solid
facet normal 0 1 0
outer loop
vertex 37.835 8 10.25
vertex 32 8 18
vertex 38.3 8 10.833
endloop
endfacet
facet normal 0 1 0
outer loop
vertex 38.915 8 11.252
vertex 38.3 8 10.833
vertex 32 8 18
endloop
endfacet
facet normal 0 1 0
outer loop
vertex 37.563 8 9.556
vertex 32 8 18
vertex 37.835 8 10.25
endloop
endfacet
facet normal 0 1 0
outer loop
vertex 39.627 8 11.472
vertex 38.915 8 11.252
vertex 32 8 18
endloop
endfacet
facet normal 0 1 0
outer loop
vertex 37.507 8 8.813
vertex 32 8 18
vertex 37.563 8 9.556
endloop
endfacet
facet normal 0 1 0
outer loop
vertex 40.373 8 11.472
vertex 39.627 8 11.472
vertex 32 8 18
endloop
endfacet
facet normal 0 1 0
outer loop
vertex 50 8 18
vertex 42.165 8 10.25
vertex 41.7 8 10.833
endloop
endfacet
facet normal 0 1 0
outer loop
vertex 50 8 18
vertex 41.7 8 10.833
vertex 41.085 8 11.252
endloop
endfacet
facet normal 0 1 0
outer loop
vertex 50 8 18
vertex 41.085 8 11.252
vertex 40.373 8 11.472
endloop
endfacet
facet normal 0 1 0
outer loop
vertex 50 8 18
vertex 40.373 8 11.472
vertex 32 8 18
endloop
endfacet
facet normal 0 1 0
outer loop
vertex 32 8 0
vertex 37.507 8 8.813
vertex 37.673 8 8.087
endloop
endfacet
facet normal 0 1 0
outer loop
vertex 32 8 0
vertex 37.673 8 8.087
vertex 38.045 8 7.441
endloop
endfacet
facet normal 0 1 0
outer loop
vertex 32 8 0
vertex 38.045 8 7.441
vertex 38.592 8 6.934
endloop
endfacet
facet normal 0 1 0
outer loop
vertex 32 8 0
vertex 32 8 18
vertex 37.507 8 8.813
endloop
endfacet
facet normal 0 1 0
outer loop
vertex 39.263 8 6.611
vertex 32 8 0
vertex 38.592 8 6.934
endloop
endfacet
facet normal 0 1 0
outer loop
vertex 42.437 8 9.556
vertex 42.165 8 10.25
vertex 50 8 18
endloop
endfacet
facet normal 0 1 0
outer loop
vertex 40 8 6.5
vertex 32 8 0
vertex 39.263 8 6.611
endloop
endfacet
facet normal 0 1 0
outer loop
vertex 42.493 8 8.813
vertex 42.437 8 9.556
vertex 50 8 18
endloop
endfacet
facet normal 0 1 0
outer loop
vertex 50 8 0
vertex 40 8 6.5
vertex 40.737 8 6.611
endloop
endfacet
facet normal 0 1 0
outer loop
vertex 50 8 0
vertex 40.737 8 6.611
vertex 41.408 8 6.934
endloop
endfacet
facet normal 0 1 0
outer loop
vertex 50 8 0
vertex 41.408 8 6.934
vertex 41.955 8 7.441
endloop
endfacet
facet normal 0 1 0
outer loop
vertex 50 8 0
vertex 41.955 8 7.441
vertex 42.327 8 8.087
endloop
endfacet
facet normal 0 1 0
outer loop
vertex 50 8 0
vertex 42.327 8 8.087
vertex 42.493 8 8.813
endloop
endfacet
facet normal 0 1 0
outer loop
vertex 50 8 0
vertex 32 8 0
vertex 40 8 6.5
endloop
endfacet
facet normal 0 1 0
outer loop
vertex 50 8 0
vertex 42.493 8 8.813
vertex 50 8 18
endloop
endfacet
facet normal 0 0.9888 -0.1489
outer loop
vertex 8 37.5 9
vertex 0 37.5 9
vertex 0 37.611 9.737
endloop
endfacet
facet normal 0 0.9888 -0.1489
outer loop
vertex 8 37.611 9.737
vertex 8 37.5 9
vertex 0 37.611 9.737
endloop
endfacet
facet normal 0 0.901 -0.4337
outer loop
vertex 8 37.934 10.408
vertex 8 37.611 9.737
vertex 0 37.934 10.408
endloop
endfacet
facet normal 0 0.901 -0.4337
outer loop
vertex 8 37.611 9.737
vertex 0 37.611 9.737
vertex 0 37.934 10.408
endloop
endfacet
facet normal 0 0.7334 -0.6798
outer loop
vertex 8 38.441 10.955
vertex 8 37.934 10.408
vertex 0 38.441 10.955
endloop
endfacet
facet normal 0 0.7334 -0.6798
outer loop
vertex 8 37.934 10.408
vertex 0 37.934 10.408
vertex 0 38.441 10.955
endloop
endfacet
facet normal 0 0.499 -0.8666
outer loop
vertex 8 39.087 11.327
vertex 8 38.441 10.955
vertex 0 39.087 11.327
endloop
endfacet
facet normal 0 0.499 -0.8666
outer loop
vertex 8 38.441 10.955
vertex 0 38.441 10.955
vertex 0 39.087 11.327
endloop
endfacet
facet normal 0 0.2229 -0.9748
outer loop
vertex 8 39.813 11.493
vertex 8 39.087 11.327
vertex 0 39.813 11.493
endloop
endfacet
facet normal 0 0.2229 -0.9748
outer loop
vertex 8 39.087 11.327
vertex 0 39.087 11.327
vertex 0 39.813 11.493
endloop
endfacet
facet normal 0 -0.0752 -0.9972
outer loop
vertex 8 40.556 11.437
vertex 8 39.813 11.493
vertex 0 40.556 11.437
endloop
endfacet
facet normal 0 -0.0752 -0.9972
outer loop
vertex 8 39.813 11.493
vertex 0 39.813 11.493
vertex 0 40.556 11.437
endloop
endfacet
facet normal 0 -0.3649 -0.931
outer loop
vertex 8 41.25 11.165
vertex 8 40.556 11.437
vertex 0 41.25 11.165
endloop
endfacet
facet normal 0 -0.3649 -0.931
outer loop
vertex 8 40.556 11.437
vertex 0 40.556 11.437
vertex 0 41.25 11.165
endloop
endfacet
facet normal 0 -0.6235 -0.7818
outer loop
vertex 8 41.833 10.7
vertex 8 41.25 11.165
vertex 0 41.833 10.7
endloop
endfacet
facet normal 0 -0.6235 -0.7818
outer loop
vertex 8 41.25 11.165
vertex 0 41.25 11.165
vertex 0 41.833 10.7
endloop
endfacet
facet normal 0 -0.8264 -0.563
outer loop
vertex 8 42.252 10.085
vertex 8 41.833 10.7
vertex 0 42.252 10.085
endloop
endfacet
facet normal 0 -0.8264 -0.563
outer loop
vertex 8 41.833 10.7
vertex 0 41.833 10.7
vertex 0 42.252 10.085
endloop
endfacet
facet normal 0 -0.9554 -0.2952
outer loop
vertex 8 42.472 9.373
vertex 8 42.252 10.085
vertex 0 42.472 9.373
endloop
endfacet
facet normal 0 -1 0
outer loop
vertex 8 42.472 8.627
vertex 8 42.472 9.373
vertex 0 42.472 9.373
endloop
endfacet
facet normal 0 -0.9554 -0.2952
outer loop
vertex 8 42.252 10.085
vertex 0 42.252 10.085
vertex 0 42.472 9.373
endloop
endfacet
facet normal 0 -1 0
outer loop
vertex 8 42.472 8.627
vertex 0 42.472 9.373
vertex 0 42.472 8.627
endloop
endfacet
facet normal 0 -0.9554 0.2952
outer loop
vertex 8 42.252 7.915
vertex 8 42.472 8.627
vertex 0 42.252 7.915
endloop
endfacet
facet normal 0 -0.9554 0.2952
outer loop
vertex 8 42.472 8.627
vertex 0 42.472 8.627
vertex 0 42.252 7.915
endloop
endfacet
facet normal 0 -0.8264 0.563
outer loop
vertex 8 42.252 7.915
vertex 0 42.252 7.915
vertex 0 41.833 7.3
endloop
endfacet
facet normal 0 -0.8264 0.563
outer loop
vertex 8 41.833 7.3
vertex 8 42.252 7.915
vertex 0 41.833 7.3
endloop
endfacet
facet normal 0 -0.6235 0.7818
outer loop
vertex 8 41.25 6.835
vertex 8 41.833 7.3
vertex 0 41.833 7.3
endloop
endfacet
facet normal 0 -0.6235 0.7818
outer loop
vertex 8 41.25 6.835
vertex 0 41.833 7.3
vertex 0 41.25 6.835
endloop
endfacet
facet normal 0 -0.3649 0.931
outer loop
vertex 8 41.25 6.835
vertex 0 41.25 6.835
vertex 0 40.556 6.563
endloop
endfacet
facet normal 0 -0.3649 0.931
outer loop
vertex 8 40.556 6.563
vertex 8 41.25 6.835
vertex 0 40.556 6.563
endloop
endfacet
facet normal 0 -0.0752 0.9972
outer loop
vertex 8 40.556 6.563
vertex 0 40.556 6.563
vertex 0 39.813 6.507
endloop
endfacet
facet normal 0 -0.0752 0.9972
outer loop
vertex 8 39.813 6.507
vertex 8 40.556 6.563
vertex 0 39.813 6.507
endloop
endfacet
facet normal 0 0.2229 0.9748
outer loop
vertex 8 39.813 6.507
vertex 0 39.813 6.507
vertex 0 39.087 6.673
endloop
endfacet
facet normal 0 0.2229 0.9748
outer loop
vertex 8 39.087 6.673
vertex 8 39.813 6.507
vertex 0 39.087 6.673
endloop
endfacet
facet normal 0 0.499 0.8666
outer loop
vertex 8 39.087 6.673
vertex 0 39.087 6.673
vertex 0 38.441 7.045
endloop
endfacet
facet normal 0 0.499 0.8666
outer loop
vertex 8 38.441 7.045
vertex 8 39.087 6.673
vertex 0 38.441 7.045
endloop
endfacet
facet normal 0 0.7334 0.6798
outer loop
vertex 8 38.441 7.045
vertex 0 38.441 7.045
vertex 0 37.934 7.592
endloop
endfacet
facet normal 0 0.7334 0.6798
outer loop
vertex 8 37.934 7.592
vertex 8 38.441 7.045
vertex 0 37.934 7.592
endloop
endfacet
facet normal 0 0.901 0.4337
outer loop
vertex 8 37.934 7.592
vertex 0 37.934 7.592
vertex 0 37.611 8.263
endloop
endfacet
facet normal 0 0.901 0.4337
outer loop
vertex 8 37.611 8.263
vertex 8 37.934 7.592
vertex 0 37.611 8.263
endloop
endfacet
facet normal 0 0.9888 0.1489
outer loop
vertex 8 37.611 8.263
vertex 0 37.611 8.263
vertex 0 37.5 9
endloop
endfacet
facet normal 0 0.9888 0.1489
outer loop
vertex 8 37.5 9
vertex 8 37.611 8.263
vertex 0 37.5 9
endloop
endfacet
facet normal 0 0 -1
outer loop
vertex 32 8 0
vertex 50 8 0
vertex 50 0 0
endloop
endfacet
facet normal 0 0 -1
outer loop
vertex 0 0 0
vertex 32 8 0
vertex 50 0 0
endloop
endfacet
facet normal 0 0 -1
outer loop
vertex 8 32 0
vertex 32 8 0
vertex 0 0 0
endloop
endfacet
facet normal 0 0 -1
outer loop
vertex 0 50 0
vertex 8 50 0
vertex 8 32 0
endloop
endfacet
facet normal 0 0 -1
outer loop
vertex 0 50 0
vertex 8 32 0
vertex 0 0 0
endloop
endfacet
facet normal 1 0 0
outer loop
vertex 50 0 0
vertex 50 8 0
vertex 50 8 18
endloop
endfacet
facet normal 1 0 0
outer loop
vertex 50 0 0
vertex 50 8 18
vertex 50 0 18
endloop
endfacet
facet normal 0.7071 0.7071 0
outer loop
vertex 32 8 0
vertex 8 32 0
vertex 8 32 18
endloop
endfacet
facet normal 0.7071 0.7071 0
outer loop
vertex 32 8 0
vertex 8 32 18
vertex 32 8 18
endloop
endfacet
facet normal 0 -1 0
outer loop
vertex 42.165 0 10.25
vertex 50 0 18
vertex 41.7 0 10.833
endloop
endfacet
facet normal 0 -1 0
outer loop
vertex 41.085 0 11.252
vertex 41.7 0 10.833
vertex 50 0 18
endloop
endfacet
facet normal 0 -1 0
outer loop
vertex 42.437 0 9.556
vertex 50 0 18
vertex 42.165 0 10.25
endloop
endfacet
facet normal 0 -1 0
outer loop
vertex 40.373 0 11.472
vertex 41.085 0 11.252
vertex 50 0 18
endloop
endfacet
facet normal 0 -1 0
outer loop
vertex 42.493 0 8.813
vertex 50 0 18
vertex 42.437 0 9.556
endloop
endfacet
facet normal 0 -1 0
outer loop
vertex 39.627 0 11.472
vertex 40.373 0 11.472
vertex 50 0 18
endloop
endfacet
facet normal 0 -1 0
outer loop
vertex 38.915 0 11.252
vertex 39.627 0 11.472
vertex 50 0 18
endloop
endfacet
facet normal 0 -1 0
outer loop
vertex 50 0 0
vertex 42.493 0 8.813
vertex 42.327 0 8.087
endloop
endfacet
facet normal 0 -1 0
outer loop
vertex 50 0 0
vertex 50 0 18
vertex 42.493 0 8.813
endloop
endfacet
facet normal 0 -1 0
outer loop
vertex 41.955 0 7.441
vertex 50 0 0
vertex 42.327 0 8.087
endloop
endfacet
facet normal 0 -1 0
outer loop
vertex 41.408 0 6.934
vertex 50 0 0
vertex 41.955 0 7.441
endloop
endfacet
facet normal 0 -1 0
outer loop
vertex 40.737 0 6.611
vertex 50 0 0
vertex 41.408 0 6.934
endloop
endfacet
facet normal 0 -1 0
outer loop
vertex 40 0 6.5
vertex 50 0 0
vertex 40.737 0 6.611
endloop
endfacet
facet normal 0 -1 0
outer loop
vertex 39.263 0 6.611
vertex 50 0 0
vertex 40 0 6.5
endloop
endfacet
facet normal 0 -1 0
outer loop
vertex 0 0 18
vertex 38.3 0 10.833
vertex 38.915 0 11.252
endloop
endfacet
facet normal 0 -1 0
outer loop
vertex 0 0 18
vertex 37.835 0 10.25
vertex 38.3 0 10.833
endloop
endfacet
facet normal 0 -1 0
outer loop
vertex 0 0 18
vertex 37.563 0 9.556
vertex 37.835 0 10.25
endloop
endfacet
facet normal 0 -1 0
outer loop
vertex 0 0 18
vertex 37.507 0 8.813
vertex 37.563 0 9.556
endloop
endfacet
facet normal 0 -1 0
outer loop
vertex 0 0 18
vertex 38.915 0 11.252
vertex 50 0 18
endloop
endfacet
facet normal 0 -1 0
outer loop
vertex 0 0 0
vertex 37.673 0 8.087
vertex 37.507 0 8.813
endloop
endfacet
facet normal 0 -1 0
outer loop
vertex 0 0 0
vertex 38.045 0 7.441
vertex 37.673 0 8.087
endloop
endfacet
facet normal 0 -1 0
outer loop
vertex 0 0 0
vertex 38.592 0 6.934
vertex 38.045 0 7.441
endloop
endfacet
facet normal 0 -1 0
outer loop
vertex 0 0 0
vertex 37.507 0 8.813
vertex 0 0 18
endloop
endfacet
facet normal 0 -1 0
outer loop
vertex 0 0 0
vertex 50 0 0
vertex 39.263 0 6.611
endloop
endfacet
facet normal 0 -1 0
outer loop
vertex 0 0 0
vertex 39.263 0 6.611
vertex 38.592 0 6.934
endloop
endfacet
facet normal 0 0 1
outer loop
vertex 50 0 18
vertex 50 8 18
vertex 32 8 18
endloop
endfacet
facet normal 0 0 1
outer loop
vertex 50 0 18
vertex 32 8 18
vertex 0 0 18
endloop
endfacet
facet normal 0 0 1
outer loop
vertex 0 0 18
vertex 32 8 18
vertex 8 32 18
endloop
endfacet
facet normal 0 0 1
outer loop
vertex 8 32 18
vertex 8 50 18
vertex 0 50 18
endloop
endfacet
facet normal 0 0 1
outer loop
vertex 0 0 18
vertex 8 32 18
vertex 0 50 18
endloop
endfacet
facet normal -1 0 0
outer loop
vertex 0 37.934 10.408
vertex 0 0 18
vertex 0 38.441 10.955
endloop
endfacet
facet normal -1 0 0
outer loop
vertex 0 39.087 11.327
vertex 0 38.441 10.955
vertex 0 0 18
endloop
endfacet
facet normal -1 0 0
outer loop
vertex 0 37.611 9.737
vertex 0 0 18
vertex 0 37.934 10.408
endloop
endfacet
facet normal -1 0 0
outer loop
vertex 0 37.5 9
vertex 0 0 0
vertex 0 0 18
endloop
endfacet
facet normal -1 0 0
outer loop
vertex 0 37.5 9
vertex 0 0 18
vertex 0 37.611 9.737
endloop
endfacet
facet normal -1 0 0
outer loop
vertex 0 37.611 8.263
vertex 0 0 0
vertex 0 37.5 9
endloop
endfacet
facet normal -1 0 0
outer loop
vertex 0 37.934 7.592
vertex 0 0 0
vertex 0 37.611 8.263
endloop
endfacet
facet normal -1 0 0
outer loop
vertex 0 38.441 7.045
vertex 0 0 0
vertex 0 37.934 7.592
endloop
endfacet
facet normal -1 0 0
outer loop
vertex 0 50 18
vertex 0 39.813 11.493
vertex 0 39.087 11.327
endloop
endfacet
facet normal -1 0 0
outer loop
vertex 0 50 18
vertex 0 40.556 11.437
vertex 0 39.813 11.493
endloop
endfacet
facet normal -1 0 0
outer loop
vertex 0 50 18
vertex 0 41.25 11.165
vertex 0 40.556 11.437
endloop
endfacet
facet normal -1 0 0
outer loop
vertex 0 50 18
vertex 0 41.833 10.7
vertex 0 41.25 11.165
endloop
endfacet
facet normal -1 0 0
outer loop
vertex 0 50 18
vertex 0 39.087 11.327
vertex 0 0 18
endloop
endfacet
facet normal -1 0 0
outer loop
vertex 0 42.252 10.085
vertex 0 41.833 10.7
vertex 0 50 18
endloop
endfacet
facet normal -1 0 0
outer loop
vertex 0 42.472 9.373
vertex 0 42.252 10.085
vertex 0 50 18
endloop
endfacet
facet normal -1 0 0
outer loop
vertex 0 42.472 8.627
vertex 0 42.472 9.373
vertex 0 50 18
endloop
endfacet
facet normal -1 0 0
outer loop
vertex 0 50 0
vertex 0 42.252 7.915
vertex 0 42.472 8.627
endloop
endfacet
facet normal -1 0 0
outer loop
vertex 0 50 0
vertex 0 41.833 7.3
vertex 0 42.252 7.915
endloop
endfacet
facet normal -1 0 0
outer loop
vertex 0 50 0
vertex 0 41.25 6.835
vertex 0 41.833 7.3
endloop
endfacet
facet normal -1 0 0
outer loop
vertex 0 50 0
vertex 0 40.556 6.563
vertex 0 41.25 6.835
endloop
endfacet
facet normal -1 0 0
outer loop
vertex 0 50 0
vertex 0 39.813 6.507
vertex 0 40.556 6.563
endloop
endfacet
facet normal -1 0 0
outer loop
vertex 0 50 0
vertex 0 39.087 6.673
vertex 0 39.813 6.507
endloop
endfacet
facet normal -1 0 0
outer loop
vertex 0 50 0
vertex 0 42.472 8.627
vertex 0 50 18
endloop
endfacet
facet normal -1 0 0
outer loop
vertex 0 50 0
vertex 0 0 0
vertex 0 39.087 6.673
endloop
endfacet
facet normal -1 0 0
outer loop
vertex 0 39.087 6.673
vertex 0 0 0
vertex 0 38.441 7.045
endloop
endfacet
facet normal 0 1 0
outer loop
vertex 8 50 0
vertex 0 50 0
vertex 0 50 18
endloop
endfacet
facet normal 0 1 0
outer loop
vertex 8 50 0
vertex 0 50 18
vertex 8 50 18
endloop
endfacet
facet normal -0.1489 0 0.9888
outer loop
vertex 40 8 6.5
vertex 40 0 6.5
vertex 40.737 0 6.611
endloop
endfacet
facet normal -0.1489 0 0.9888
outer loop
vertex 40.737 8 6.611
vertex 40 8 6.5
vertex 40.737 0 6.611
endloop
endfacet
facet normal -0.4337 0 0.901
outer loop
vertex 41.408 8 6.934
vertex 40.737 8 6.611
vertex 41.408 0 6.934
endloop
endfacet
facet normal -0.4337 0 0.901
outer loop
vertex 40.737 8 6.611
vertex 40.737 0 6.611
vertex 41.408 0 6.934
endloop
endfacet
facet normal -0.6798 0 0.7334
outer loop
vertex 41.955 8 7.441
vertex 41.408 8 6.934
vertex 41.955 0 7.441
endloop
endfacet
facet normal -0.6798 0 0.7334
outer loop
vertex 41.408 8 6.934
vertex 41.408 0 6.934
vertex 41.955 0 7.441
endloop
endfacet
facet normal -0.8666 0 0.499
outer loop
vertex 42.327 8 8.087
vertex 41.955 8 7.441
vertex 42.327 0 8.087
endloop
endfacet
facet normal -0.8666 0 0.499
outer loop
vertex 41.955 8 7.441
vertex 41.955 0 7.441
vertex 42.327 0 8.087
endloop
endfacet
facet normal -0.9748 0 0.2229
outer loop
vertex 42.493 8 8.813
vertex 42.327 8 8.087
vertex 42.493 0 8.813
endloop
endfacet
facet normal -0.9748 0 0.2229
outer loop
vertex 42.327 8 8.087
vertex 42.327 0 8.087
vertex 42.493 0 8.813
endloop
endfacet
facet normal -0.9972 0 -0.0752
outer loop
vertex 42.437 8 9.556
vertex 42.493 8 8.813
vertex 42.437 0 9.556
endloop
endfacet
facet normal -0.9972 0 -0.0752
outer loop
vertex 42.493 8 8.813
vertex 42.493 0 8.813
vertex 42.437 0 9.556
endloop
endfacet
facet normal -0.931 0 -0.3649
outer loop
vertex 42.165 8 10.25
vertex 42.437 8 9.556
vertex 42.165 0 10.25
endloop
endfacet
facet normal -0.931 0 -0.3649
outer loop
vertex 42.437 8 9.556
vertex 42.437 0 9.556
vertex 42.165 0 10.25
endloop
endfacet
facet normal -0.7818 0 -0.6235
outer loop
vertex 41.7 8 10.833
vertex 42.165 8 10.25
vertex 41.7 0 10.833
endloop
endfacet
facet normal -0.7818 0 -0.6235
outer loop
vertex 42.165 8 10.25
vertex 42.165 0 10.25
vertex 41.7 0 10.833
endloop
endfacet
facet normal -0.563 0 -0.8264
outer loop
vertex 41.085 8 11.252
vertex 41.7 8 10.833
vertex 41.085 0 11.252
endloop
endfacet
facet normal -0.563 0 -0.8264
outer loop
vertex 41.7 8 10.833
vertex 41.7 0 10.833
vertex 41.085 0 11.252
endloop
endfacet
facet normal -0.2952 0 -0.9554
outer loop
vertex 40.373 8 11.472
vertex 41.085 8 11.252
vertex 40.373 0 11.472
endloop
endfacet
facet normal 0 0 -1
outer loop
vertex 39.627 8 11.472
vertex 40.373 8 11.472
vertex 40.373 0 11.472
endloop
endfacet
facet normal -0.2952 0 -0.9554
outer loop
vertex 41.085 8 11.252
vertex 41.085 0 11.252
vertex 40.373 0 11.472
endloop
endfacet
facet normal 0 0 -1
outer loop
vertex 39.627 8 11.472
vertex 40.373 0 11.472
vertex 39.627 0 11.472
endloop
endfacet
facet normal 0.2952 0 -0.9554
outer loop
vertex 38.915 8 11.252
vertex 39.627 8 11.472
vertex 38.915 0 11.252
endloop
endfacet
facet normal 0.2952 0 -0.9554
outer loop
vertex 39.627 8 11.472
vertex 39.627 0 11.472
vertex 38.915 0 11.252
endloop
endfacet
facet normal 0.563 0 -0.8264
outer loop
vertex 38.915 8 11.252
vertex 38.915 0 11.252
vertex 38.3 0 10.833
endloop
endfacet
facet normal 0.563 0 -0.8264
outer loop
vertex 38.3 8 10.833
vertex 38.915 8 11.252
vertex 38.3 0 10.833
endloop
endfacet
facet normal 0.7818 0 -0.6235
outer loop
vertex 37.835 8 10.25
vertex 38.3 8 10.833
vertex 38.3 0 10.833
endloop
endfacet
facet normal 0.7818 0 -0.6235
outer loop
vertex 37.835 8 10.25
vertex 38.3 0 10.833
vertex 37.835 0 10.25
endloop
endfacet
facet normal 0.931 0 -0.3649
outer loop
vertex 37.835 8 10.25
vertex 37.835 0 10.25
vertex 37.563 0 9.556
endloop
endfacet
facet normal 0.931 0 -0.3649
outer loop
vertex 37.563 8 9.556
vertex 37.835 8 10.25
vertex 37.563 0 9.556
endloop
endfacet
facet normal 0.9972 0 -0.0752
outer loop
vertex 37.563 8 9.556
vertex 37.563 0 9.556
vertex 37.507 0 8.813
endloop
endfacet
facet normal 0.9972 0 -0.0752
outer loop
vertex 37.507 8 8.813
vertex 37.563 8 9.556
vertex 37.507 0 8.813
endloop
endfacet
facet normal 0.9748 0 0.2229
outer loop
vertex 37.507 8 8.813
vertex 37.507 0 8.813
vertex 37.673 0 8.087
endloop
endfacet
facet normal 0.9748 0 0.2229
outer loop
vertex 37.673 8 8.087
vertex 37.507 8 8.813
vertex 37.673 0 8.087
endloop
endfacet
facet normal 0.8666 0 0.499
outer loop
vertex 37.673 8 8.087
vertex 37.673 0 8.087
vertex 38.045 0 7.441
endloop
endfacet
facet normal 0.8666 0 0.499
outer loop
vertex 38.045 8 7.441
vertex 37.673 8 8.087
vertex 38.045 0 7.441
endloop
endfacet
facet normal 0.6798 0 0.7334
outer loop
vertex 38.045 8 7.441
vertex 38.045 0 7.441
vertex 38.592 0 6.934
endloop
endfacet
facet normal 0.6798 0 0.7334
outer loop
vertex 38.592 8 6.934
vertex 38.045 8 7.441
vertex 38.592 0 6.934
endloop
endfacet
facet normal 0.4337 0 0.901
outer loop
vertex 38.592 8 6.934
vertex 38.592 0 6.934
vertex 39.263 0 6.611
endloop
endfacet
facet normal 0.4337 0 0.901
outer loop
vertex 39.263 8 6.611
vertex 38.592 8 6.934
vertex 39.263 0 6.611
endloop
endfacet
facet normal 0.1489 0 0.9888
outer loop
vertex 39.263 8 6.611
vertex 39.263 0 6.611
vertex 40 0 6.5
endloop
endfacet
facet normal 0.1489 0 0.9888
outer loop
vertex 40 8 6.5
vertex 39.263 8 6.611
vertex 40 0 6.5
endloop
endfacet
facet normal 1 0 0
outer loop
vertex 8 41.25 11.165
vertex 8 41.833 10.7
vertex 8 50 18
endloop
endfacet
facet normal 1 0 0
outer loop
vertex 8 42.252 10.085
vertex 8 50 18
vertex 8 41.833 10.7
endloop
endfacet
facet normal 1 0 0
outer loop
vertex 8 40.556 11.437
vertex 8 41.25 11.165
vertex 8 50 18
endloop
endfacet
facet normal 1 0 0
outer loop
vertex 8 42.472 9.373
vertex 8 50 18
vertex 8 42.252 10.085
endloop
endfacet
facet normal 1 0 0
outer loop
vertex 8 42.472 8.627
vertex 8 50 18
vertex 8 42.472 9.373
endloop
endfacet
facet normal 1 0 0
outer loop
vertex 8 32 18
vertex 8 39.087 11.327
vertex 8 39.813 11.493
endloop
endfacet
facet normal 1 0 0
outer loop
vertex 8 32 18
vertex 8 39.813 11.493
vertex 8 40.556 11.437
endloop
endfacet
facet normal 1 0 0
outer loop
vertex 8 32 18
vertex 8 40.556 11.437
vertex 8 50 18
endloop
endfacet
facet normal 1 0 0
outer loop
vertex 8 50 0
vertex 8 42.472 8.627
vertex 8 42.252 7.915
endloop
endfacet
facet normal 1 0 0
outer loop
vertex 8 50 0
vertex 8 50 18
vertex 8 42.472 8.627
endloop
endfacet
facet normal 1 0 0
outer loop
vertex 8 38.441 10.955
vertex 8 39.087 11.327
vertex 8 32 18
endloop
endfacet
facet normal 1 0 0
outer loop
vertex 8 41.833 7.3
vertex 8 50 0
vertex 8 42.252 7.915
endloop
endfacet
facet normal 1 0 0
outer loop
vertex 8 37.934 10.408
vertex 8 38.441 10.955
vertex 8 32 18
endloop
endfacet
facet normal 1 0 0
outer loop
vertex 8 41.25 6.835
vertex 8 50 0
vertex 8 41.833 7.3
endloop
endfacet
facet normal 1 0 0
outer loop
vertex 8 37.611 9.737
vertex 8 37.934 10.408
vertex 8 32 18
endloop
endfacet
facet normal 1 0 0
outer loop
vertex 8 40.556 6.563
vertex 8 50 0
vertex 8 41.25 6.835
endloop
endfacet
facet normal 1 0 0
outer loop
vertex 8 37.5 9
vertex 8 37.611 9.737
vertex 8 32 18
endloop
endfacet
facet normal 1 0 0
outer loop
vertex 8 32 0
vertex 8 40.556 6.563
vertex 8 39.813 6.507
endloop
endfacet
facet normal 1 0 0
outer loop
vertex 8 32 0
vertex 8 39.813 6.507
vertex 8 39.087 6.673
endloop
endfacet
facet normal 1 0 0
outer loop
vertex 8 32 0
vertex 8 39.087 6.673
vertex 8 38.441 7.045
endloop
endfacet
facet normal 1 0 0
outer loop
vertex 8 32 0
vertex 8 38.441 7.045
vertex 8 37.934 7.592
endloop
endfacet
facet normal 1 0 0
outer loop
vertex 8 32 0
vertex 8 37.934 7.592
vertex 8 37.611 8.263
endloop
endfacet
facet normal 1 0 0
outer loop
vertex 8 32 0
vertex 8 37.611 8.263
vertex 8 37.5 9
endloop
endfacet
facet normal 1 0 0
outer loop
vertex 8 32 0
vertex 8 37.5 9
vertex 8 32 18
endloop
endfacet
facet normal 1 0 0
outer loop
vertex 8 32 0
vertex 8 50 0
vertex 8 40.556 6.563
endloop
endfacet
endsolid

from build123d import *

# Parameters (mm, degrees)
EXTRUDE_1_DEPTH     = 18
SKETCH_2_R          = 2.5
CUT_EXTRUDE_1_DEPTH = 73.965745388
SKETCH_3_R          = 2.5
CUT_EXTRUDE_2_DEPTH = 73.965745388


with BuildPart() as part:
    # 草图1 → 凸台-拉伸1 (new body)
    with BuildSketch(Plane.XY):
        Polygon((32, 8), (50, 8), (50, 0), (0, 0), (0, 50), (8, 50), (8, 32), align=None)
    extrude(amount=EXTRUDE_1_DEPTH)

    # 草图2 → 切除-拉伸1 (cut, through all)
    with BuildSketch(Plane.XZ):
        with Locations(Location((40, 9, 0), (0, 0, 270))):
            Circle(SKETCH_2_R)
    extrude(amount=-CUT_EXTRUDE_1_DEPTH, mode=Mode.SUBTRACT)

    # 草图3 → 切除-拉伸2 (cut, through all)
    with BuildSketch(Plane.ZY):
        with Locations(Location((9, 40, 0), (0, 0, 270))):
            Circle(SKETCH_3_R)
    extrude(amount=-CUT_EXTRUDE_2_DEPTH, mode=Mode.SUBTRACT)


solid = part.part
